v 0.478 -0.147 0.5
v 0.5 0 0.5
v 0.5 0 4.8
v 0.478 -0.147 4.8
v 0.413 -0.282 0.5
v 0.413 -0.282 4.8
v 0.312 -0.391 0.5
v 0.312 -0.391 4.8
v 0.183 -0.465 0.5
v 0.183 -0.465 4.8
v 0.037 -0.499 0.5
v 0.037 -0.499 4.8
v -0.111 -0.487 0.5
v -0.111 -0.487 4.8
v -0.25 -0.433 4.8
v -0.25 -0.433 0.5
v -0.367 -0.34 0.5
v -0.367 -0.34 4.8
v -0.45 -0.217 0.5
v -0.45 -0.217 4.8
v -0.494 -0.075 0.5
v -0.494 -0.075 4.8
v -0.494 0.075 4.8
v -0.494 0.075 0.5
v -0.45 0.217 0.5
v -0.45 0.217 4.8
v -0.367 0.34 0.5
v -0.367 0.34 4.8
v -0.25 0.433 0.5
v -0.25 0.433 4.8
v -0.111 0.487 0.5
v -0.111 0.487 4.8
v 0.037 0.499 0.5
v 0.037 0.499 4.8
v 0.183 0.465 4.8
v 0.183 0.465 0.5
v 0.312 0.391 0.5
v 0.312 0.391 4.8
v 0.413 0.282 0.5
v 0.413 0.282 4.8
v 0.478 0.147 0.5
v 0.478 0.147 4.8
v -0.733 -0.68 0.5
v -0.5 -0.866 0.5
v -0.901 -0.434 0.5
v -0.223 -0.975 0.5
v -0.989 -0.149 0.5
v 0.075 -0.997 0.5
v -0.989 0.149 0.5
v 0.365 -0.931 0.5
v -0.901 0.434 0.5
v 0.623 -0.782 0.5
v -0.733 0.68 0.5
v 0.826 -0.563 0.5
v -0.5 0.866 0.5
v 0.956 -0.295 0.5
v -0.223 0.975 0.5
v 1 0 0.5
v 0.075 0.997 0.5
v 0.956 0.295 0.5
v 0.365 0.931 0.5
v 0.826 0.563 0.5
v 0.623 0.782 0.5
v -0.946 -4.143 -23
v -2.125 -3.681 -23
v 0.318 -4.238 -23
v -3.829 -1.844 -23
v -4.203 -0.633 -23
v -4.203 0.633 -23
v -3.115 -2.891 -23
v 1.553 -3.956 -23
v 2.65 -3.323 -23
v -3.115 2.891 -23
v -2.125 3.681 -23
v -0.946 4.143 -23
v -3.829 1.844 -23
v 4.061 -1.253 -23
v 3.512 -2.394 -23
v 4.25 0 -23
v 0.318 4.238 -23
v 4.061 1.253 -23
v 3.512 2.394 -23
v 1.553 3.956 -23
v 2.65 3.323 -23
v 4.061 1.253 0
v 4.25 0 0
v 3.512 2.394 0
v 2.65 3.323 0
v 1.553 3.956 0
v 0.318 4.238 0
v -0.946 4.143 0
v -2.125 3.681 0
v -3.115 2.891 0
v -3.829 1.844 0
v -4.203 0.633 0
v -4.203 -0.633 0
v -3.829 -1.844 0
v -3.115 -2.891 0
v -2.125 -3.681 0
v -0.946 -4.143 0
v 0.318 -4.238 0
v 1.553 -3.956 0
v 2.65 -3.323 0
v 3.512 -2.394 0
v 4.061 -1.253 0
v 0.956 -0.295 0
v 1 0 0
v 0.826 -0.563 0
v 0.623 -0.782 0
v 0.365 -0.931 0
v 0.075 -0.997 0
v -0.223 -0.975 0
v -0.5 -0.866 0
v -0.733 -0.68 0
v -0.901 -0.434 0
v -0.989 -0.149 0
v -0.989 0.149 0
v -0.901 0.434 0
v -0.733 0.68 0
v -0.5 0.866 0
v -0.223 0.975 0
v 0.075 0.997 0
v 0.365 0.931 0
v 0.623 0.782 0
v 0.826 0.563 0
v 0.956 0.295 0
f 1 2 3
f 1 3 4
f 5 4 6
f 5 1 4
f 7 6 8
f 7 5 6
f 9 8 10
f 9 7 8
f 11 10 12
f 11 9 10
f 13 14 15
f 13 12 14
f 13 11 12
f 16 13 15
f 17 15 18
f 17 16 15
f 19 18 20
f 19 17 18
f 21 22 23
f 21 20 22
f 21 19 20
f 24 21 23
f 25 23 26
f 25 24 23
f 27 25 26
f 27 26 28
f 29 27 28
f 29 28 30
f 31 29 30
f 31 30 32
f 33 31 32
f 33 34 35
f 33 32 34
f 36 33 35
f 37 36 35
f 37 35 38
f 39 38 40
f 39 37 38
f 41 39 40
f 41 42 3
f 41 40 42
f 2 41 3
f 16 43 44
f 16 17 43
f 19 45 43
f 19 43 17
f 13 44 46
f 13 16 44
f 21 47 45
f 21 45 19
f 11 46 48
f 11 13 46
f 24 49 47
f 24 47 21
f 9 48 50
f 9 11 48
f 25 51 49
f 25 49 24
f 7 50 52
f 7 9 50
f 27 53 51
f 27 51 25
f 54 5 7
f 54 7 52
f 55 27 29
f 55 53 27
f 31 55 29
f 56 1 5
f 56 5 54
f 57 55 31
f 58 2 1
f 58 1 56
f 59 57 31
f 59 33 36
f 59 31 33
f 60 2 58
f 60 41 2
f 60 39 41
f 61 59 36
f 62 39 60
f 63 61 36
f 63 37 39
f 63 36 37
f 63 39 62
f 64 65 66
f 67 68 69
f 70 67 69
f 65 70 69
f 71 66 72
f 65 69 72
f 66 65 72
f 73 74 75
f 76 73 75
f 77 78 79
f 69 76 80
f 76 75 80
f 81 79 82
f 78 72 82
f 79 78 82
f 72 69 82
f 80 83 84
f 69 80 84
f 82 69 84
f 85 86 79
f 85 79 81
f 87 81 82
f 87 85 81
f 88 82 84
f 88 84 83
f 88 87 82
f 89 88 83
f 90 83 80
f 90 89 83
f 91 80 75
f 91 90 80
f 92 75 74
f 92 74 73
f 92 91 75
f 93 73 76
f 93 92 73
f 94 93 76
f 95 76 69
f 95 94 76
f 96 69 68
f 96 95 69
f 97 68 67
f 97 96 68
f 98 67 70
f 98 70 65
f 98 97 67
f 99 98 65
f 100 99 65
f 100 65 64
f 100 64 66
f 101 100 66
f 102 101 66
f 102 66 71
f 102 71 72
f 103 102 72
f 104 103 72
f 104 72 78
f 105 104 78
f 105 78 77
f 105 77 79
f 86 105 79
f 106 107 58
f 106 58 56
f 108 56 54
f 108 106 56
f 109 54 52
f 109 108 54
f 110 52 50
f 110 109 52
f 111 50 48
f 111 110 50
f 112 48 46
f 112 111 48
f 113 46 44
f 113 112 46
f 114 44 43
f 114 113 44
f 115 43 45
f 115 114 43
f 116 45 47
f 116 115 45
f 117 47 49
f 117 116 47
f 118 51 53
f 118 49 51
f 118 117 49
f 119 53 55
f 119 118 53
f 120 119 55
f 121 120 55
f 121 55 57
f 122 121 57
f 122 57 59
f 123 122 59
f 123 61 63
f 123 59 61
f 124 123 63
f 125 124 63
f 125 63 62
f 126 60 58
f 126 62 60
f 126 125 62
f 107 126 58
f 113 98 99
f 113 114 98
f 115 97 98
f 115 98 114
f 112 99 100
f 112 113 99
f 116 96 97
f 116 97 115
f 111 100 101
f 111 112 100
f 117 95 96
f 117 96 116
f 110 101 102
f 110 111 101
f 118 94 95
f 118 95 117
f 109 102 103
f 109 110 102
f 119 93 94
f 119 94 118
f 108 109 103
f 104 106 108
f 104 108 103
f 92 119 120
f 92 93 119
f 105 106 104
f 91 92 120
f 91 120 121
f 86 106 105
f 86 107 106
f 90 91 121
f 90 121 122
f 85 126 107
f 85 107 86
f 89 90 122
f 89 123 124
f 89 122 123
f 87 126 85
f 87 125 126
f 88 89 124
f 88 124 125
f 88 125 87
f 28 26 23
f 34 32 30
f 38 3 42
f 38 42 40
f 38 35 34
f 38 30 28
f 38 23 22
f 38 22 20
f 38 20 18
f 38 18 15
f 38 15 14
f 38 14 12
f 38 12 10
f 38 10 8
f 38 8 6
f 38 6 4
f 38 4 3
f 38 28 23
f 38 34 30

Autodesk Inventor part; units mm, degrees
ref_plane "YZ Plane" through (0, 0, 0) normal (1, 0, 0) x (0, 1, 0)
ref_plane "XZ Plane" through (0, 0, 0) normal (0, 1, 0) x (-1, 0, 0)
ref_plane "XY Plane" through (0, 0, 0) normal (0, 0, 1) x (1, 0, 0)
sketch "スケッチ1" plane through (0, 0, 0) normal (0, 0, 1) x (1, 0, 0)
  circle A0 centre (0, 0) radius 4.25
  dimension "d0" = 8.5
extrude "押し出し1" add sketch "スケッチ1" against normal blind 23
sketch "スケッチ2" plane through (0, 0, 0) normal (0, 0, 1) x (1, 0, 0)
  circle A0 centre (0, 0) radius 0.5
  dimension "d3" = 1
extrude "押し出し2" add sketch "スケッチ2" along normal blind 4.8
sketch "スケッチ3" plane through (0, 0, 0) normal (0, 0, 1) x (1, 0, 0)
  circle A0 centre (0, 0) radius 0.5 projected
  circle A1 centre (0, 0) radius 1
  dimension "d6" = 2
extrude "押し出し3" add sketch "スケッチ3" along normal blind 0.5
properties part number "8523Motor"
